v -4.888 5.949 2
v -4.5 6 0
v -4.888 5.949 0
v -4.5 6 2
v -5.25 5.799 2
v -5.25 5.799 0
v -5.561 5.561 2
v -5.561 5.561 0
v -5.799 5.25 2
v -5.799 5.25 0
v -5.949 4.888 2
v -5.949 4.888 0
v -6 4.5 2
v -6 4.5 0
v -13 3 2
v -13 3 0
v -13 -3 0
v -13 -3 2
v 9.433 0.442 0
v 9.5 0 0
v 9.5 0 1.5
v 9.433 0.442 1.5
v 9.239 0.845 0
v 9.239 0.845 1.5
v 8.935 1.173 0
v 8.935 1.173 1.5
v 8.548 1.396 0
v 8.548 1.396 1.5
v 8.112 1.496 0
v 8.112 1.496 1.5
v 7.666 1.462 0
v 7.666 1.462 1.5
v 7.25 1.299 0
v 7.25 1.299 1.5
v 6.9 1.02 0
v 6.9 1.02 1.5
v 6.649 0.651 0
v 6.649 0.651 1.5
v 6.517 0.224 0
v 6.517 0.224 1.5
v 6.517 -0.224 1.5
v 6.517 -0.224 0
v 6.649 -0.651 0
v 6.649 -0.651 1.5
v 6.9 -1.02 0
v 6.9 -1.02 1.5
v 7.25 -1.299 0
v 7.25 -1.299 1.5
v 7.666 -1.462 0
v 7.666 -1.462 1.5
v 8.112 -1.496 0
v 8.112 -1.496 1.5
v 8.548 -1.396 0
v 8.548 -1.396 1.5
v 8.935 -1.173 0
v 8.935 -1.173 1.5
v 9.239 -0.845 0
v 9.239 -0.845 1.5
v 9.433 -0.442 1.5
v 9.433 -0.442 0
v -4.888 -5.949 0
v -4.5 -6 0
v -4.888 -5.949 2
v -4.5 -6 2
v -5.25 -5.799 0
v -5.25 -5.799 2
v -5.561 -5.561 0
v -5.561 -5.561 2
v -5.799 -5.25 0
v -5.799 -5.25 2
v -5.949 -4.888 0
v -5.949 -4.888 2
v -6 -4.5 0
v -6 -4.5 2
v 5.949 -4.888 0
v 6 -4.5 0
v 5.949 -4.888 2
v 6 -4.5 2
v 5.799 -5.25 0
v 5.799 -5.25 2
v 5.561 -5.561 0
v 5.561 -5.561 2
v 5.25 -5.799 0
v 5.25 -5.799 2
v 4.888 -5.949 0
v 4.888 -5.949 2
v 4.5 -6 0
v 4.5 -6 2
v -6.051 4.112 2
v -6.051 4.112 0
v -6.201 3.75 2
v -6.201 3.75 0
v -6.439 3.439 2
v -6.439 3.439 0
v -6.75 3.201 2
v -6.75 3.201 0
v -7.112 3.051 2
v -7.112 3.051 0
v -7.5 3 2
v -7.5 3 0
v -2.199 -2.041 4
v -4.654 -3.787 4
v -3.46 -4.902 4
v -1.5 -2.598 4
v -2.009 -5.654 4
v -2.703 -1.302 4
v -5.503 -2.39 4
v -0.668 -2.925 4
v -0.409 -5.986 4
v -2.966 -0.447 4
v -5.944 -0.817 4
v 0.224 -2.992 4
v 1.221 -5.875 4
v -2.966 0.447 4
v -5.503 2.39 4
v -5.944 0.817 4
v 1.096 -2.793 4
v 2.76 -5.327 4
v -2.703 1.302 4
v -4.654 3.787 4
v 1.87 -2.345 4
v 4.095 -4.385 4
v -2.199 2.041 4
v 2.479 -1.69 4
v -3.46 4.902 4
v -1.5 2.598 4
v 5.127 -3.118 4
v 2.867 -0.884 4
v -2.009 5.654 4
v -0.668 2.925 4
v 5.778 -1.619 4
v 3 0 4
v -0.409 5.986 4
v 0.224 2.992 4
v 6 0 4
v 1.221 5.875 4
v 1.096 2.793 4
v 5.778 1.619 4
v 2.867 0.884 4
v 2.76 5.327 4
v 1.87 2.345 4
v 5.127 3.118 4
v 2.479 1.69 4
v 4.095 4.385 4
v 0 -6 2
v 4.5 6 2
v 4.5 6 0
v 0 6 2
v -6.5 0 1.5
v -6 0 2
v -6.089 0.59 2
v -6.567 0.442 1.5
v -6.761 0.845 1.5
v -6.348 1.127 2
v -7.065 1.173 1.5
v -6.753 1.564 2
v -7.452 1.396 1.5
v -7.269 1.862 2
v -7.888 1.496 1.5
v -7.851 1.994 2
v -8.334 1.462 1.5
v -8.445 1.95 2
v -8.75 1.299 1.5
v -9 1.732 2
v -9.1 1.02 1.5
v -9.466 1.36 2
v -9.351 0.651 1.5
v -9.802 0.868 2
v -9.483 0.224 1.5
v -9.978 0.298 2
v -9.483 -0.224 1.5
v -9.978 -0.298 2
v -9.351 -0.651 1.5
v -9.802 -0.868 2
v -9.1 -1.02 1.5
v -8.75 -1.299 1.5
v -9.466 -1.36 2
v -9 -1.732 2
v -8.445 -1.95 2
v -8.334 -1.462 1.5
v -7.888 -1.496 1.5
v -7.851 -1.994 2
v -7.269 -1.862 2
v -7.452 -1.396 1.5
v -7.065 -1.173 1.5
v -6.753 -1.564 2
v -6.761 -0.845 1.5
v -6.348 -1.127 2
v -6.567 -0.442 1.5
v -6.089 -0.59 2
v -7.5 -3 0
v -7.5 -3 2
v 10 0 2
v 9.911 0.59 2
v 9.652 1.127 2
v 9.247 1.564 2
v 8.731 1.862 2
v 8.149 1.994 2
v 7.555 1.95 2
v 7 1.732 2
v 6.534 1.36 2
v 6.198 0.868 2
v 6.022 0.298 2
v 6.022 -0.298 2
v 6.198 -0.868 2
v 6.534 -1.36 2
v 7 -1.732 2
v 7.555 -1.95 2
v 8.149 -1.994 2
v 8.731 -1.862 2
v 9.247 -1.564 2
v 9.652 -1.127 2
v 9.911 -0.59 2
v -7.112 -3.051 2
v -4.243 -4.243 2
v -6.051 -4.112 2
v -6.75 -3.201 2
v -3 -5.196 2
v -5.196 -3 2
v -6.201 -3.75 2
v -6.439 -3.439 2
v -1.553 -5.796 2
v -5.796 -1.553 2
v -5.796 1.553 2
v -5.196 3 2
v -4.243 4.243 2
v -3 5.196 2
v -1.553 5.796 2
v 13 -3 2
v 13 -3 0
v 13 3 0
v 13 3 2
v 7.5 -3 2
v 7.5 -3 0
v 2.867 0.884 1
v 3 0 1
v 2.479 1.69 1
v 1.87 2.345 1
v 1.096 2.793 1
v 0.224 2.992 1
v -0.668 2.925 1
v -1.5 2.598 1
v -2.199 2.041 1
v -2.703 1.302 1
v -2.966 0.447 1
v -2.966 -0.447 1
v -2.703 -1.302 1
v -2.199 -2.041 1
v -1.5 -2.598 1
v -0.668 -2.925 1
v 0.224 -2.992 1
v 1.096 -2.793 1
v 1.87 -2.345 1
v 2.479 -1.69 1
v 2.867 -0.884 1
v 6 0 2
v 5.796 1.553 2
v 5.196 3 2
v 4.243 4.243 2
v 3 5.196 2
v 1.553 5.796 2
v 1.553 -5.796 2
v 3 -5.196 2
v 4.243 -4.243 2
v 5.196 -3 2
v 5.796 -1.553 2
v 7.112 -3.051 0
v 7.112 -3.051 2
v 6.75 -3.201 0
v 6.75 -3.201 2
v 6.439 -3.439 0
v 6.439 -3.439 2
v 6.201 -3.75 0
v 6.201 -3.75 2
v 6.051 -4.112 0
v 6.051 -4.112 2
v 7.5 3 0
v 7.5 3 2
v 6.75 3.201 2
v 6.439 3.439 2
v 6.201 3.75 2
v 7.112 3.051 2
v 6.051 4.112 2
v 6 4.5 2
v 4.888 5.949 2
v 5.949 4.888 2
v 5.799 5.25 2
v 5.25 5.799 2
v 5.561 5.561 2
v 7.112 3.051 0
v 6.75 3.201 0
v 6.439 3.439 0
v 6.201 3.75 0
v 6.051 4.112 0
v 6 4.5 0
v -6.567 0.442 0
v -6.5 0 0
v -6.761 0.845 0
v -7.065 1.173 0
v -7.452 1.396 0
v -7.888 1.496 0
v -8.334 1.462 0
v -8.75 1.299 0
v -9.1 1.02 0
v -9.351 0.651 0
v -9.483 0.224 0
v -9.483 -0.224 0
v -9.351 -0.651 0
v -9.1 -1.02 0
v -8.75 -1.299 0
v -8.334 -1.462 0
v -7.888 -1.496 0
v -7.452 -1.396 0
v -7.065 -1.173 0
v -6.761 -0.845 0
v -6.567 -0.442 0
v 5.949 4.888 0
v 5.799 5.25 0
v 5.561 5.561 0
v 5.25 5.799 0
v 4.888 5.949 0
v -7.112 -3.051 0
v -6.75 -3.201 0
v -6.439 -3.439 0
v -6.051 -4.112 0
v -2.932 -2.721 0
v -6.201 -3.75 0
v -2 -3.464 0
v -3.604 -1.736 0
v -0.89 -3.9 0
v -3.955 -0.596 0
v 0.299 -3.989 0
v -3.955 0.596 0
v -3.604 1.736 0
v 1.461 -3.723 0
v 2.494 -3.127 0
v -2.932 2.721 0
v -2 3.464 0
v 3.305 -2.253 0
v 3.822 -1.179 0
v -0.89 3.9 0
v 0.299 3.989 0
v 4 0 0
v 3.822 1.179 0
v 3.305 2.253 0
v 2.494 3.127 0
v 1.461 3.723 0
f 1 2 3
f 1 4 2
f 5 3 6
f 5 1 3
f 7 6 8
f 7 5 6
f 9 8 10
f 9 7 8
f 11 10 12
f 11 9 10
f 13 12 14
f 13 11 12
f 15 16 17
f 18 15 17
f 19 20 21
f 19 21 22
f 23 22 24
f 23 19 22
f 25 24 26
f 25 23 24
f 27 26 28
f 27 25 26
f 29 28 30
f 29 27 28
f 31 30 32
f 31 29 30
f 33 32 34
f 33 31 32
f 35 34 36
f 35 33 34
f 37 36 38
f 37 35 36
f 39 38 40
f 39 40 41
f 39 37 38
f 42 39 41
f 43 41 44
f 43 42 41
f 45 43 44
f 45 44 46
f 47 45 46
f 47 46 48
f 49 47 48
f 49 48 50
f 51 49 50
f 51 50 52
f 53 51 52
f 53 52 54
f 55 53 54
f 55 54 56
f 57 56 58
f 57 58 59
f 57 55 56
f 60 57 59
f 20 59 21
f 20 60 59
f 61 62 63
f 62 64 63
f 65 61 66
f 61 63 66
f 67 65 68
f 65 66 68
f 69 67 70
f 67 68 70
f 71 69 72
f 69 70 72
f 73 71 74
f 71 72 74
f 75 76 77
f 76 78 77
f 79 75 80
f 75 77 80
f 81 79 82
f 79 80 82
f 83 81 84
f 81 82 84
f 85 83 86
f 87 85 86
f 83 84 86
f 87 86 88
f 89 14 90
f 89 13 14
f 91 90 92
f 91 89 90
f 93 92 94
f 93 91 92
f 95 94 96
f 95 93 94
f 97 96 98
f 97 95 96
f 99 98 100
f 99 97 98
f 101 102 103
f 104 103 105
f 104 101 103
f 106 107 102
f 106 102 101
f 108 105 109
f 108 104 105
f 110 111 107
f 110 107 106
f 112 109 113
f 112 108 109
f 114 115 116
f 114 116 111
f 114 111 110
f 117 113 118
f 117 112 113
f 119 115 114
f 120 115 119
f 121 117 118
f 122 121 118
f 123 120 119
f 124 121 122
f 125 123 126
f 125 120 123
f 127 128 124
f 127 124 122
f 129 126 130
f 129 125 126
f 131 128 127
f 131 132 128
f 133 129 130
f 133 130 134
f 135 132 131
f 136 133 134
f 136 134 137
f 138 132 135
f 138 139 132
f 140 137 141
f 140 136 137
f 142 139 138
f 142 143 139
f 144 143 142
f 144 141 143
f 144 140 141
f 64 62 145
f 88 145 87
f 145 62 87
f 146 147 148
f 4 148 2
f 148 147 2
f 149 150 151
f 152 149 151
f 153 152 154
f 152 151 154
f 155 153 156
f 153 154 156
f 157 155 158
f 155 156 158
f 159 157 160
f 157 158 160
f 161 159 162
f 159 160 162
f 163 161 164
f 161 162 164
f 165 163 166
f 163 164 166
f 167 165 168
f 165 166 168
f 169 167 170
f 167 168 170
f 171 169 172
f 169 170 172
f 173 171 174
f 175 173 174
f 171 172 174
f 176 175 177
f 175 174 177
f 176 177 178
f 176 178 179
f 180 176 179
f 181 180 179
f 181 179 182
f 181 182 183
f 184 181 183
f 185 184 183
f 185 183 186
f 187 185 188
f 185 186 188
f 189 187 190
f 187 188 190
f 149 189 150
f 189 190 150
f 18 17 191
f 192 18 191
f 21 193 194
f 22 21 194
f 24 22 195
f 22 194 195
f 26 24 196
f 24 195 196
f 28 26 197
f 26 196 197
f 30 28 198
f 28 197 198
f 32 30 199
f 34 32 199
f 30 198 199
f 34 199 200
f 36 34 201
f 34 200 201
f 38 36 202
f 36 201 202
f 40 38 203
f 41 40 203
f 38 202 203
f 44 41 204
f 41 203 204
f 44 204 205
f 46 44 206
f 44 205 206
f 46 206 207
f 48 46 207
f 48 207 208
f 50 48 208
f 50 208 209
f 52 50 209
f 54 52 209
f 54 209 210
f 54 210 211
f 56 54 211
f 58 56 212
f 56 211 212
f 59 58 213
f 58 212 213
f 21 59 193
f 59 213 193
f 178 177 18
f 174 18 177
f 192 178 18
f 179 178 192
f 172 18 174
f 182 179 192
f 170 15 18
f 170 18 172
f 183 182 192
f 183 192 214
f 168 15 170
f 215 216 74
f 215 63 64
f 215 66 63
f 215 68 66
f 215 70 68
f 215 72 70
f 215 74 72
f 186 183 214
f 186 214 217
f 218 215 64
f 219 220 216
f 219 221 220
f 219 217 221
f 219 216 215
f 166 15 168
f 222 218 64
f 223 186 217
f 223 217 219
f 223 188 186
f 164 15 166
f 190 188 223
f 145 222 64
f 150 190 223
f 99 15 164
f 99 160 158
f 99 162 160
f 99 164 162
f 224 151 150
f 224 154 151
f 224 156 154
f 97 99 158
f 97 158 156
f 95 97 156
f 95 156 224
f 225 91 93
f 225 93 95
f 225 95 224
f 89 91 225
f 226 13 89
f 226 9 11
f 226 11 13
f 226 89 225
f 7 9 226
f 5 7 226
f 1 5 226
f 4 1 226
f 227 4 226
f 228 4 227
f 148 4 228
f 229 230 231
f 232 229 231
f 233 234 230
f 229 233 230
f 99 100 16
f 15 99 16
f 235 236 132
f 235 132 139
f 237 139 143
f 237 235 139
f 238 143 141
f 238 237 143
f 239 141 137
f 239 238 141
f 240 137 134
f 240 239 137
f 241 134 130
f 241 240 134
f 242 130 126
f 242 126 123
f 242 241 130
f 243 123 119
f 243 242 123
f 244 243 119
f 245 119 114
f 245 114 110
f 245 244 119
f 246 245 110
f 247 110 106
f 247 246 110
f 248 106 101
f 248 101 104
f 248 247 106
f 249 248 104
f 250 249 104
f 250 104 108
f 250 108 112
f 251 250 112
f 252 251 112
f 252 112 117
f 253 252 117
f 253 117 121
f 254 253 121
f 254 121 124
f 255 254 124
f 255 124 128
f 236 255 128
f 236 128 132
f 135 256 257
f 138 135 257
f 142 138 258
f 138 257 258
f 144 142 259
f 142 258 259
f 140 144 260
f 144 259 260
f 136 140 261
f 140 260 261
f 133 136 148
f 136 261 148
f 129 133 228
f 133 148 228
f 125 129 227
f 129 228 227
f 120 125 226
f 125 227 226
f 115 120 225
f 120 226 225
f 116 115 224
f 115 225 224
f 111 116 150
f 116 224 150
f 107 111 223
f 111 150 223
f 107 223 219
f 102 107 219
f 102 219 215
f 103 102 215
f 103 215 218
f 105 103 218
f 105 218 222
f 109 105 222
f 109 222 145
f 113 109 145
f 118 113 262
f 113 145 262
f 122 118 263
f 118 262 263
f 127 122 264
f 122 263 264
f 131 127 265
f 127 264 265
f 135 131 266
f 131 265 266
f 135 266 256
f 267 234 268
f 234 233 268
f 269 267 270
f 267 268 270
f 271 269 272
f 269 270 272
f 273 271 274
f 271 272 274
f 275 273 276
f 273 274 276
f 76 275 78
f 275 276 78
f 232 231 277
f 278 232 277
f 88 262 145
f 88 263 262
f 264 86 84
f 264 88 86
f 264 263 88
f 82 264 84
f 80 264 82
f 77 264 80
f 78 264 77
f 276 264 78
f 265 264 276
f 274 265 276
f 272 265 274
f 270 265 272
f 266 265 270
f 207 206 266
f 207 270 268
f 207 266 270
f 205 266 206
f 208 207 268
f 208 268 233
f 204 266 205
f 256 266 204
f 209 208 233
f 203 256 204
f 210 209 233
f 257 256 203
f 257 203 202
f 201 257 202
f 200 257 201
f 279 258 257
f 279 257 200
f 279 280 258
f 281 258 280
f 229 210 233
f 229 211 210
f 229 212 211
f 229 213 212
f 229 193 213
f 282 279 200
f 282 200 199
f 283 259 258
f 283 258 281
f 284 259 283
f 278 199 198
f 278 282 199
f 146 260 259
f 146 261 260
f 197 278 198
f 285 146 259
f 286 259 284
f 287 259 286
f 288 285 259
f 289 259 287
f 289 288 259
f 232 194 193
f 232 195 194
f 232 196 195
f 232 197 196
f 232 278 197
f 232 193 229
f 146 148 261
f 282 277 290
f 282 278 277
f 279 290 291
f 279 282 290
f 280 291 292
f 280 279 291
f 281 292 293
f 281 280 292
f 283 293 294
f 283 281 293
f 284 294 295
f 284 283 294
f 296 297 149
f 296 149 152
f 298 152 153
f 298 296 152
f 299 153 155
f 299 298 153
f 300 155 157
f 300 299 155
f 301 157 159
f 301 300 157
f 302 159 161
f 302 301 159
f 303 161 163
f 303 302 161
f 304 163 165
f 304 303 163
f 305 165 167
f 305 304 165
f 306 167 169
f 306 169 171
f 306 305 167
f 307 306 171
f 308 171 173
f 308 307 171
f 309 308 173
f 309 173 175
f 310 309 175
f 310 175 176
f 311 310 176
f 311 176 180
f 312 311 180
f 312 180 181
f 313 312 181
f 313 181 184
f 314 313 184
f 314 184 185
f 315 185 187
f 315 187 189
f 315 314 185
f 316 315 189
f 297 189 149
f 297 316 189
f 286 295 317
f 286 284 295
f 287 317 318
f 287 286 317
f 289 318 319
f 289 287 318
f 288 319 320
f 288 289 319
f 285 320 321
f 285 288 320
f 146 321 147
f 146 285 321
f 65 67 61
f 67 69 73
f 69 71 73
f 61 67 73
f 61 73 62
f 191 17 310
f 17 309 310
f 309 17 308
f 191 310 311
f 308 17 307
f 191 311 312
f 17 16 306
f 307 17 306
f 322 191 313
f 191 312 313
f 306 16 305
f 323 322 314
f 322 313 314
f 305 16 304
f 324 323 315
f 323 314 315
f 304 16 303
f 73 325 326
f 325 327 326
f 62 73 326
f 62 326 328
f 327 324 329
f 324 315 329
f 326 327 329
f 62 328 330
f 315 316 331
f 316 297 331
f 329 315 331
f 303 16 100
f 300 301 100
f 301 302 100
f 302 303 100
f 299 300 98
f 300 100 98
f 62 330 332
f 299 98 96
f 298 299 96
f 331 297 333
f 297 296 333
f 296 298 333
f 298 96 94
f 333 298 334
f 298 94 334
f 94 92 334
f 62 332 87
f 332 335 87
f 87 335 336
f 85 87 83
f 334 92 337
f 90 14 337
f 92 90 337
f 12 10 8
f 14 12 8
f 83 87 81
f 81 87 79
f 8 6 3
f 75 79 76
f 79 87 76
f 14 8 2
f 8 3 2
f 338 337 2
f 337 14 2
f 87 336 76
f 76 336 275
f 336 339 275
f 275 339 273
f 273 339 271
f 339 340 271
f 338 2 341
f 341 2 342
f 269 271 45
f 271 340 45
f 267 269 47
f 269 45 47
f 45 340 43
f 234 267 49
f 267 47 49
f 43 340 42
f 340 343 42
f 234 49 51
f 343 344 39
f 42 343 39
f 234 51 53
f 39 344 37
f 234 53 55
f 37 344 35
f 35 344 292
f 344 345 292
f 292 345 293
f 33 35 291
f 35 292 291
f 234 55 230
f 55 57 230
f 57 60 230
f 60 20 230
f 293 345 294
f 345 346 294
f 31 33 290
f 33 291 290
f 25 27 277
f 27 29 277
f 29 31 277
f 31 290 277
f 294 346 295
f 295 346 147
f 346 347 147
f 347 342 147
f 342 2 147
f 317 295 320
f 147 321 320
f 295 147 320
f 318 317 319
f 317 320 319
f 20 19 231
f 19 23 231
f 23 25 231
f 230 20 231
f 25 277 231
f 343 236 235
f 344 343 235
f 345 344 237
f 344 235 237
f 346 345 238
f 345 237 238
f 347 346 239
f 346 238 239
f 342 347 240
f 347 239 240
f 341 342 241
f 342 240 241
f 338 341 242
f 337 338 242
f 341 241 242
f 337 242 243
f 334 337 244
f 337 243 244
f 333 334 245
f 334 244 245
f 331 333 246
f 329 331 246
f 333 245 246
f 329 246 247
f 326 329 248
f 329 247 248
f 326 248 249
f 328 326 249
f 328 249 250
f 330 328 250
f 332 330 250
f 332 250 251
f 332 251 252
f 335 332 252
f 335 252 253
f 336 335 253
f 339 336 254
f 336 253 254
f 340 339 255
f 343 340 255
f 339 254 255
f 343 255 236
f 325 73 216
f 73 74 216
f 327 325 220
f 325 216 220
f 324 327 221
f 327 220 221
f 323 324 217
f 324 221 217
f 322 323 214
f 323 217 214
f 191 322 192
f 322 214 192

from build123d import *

# Parameters (mm, degrees)
F0_R     = 1.5
F0_R_2   = 3
F1_DEPTH = 2
F2_R     = 6
F2_R_2   = 3
F3_DEPTH = 2
F4_R     = 1.49999
F5_SIZE  = 1
F6_SIZE  = 0.49999


# Not quite as in the source:
# - a fillet or chamfer is up to 0.001 mm smaller than in the source, because OpenCascade refuses the exact size


with BuildPart() as f1:
    # F0 (on Top) → F1 (new body)
    with BuildSketch(Plane.XY):
        Polygon((-6, 3), (-13, 3), (-13, -3), (-6, -3), (-6, -6), (6, -6), (6, -3), (13, -3), (13, 3), (6, 3), (6, 6), (-6, 6), align=None)
        with Locations((-8, 0)):
            Circle(F0_R, mode=Mode.SUBTRACT)
        Circle(F0_R_2, mode=Mode.SUBTRACT)
        with Locations((8, 0)):
            Circle(F0_R, mode=Mode.SUBTRACT)
    extrude(amount=F1_DEPTH)

    # F2 (on face) → F3 (join)
    with BuildSketch(Plane.XY.offset(2)):
        Circle(F2_R)
        Circle(F2_R_2, mode=Mode.SUBTRACT)
    extrude(amount=F3_DEPTH)

    # F4 (radius 1.5 in the source; OpenCascade refuses exactly that, so slightly less here)
    f4_edges = [f1.edges().sort_by_distance(p)[0] for p in [
        (-6, -6, 1),
        (6, -6, 1),
        (6, 6, 1),
        (-6, 6, 1),
        (-6, 3, 1),
        (-6, -3, 1),
        (6, 3, 1),
        (6, -3, 1),
    ]]
    fillet(f4_edges, radius=F4_R)

    # F5
    f5_edges = [f1.edges().sort_by_distance(p)[0] for p in [
        (-3, 0, 0),
    ]]
    chamfer(f5_edges, length=F5_SIZE)

    # F6 (size 0.5 in the source; OpenCascade refuses exactly that, so slightly less here)
    f6_edges = [f1.edges().sort_by_distance(p)[0] for p in [
        (-9.5, 0, 2),
        (6.5, 0, 2),
    ]]
    chamfer(f6_edges, length=F6_SIZE)


solid = f1.part
